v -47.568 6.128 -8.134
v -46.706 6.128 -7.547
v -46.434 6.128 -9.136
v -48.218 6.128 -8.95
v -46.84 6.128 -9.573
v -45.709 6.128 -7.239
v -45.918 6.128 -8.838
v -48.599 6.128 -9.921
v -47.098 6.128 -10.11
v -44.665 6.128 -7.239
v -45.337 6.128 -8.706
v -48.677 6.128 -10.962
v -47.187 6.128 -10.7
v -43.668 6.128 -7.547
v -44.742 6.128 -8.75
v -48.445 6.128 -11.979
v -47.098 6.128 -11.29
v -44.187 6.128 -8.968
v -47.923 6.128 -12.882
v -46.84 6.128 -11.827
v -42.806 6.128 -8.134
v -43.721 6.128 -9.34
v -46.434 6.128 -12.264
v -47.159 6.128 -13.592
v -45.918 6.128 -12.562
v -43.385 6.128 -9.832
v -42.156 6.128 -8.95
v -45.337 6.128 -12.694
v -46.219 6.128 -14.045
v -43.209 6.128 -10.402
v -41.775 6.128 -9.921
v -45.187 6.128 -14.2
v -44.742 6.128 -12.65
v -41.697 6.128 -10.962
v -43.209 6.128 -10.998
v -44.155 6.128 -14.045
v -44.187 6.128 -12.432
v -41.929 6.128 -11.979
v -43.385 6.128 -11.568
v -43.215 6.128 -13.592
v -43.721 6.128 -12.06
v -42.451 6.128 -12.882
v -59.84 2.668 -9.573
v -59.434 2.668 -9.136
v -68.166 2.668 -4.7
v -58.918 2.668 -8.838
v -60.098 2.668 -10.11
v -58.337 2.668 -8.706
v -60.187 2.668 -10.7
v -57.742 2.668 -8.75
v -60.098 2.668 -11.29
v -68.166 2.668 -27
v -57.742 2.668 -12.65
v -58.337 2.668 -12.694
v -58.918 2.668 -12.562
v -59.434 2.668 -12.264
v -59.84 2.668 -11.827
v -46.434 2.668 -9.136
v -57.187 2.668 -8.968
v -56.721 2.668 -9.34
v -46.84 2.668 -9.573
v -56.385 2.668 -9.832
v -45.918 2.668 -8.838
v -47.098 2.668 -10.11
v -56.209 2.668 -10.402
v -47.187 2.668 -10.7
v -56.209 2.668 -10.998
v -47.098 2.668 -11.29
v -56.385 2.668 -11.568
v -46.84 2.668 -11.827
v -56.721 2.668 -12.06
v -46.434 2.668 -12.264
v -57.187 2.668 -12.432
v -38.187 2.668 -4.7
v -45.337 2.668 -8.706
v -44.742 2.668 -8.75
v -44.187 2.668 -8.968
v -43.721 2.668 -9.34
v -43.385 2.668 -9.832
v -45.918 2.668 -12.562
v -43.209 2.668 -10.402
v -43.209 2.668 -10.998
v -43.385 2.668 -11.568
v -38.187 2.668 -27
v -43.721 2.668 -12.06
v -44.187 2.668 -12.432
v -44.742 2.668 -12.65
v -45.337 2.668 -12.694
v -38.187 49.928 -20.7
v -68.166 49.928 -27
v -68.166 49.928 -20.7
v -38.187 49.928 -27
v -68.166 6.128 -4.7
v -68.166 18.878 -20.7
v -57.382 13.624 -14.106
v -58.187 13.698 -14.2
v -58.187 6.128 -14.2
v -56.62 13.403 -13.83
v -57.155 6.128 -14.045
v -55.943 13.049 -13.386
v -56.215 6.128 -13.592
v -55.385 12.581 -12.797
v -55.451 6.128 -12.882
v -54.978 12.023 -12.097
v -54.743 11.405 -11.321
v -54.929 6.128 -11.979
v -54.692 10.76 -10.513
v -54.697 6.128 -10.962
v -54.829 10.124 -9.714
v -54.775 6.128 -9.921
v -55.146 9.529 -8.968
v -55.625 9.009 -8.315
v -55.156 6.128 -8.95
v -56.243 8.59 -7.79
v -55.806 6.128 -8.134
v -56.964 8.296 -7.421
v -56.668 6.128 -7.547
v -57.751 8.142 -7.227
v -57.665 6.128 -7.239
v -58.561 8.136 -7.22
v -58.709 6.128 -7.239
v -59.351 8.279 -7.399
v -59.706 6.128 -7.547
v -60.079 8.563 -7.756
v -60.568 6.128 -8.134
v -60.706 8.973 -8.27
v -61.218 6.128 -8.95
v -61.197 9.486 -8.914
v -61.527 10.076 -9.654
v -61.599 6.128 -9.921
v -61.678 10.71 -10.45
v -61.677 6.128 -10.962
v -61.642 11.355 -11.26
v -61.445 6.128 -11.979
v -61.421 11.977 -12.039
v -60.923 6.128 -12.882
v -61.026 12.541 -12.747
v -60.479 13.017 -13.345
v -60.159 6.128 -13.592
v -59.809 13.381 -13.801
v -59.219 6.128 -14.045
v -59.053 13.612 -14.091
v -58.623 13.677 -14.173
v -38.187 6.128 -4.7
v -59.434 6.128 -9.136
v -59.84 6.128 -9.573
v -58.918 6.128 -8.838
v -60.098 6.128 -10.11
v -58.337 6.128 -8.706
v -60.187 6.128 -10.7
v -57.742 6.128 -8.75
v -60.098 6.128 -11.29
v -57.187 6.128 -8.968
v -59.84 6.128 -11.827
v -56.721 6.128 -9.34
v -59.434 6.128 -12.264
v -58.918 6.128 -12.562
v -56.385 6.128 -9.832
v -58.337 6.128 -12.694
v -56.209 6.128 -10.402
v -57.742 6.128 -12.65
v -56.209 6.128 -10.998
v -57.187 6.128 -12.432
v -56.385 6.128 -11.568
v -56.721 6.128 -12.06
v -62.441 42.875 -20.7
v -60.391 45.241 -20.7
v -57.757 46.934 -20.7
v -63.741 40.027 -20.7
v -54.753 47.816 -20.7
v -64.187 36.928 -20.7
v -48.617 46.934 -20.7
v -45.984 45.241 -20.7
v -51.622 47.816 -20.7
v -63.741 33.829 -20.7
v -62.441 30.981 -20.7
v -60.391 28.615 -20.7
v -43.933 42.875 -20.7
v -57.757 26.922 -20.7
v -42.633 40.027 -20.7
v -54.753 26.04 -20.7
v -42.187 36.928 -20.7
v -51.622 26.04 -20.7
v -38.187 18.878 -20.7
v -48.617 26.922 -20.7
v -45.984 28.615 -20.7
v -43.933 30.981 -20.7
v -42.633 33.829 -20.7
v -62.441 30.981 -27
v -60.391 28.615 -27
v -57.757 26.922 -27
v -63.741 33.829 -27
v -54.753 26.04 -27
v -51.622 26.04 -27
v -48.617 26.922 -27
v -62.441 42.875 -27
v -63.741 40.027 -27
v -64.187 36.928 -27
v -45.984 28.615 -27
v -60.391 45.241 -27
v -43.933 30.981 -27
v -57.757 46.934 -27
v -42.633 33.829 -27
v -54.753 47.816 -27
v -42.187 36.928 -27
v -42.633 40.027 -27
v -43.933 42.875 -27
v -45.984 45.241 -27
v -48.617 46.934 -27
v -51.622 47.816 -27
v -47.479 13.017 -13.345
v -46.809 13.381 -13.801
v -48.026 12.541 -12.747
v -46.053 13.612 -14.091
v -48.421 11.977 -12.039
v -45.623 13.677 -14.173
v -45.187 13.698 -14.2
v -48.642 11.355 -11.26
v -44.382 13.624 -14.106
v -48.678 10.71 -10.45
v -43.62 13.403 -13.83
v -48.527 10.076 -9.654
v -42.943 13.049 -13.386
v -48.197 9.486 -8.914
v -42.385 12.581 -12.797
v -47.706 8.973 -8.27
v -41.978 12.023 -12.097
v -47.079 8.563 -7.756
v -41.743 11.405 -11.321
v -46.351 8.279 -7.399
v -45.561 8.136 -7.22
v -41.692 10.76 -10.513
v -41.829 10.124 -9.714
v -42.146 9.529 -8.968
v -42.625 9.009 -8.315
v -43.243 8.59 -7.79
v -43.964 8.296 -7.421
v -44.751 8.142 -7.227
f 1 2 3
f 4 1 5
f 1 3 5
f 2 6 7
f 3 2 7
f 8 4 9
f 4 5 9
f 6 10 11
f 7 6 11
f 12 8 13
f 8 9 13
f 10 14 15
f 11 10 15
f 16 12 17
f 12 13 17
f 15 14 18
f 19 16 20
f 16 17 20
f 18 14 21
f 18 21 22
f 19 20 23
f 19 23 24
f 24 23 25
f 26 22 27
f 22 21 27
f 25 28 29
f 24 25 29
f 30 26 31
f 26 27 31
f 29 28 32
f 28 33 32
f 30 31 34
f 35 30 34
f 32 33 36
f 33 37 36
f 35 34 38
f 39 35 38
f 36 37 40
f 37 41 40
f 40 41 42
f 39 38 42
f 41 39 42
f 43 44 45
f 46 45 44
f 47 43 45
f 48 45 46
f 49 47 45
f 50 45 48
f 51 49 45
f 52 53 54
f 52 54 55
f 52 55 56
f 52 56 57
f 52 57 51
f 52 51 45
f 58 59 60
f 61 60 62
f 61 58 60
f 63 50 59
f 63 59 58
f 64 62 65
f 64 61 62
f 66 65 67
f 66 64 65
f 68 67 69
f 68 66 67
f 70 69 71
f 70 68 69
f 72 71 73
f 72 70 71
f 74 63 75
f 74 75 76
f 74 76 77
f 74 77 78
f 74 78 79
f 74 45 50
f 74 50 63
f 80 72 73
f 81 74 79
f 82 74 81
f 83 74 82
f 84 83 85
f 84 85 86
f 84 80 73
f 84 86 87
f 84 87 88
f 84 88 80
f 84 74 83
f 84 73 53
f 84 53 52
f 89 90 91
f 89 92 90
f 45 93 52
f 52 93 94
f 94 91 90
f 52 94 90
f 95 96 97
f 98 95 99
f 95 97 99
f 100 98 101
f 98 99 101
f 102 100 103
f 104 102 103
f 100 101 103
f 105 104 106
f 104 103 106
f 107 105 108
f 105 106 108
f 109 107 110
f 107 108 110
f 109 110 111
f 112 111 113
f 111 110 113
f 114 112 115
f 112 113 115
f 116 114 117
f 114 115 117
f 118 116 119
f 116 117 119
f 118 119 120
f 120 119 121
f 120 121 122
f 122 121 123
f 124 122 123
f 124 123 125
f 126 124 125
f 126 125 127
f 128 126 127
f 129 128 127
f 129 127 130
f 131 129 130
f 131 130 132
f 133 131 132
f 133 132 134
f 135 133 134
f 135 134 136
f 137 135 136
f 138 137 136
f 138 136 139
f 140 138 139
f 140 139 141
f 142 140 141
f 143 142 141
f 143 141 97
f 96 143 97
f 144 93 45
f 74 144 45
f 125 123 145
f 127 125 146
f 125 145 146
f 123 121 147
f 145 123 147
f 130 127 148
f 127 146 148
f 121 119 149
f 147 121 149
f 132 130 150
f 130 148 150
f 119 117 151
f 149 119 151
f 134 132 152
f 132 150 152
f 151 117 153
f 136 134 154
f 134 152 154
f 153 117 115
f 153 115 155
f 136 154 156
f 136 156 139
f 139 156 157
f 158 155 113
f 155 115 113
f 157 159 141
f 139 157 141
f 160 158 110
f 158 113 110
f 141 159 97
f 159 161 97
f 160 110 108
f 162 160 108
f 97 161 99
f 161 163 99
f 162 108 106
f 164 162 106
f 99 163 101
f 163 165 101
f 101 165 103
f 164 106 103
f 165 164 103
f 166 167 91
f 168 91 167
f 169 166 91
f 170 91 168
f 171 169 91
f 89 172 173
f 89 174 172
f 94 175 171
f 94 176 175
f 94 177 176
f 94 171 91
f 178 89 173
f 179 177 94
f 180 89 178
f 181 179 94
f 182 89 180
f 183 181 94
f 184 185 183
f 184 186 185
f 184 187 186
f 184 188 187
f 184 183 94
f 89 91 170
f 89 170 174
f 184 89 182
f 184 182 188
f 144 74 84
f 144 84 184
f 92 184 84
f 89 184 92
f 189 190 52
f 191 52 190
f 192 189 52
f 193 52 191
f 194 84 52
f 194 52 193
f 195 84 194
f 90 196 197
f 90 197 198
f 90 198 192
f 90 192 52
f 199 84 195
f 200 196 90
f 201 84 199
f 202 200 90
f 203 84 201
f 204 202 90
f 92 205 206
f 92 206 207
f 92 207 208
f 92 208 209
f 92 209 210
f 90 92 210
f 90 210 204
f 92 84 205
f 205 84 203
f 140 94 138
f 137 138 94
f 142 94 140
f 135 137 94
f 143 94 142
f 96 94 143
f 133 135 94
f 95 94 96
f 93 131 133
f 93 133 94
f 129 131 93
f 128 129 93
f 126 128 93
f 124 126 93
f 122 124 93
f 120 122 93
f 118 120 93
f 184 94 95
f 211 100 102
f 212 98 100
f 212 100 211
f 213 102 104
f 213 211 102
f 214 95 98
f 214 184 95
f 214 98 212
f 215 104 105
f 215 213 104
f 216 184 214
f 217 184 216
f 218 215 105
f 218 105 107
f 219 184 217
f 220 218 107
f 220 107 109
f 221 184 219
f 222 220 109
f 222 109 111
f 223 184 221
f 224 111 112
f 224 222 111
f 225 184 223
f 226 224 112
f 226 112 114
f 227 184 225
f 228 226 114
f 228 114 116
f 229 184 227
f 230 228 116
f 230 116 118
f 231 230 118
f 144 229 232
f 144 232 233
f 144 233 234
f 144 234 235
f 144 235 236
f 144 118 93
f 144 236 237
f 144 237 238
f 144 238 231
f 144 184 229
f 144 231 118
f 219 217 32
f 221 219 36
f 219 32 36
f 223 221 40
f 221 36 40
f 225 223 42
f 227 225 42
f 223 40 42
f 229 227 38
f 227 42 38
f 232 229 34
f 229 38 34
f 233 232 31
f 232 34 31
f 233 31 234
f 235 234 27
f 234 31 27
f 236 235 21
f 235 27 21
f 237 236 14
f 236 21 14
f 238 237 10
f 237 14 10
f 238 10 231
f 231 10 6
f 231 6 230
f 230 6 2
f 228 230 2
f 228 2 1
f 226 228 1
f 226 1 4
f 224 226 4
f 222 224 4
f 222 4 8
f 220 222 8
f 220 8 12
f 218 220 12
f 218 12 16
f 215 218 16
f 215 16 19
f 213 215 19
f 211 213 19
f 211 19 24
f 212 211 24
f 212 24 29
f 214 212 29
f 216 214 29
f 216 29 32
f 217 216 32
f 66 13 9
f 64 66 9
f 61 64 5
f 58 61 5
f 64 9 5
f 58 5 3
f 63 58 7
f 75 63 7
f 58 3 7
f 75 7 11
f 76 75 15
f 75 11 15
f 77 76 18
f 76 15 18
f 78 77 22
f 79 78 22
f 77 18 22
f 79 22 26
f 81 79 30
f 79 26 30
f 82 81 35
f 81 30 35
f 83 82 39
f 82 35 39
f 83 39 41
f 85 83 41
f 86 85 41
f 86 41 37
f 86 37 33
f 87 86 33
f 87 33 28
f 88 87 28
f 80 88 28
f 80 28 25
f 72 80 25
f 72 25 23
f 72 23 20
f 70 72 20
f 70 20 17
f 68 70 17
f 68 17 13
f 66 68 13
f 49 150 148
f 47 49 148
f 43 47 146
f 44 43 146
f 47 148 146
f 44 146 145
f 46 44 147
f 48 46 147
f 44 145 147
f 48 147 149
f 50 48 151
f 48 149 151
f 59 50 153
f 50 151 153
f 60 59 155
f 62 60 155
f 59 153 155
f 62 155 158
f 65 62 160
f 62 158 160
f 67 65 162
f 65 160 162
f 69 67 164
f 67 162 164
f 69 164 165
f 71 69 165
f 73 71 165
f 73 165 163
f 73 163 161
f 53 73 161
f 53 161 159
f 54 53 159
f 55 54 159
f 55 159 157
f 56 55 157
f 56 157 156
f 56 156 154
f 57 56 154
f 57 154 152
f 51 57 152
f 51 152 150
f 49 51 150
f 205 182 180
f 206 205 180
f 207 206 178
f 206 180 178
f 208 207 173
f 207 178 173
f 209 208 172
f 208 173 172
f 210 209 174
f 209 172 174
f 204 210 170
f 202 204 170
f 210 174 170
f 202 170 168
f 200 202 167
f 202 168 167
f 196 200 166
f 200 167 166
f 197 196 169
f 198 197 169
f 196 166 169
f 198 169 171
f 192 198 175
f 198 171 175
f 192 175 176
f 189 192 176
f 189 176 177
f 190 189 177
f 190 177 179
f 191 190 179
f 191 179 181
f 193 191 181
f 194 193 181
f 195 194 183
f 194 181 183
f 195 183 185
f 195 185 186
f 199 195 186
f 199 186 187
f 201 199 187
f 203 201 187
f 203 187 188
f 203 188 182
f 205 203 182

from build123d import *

# Parameters (mm, degrees)
SKETCH1_W            = 93
SKETCH1_H            = 100
BOSS_EXTRUDE2_DEPTH  = 10
SKETCH4_W            = 10.01
SKETCH4_H            = 15
BOSS_EXTRUDE4_DEPTH  = 24
SKETCH5_R            = 2
CUT_EXTRUDE1_DEPTH   = 50
SKETCH7_R            = 11
CUT_EXTRUDE3_DEPTH   = 50
SKETCH14_W           = 61.5
SKETCH14_H           = 42
CUT_EXTRUDE8_DEPTH   = 4
SKETCH19_R           = 11
CUT_EXTRUDE11_DEPTH  = 15
SKETCH20_R           = 2
CUT_EXTRUDE12_DEPTH  = 10
SKETCH21_W           = 40
SKETCH21_H           = 6
BOSS_EXTRUDE5_DEPTH  = 27
SKETCH22_W           = 40
SKETCH22_H           = 6.3
BOSS_EXTRUDE7_DEPTH  = 40
SKETCH23_R           = 8
CUT_EXTRUDE13_DEPTH  = 40
SKETCH24_W           = 118.277817783
SKETCH24_H           = 41.8
CUT_EXTRUDE14_DEPTH  = 40
SKETCH25_W           = 31.5
SKETCH25_H           = 23.2
CUT_EXTRUDE15_DEPTH  = 20
CUT_EXTRUDE18_DEPTH  = 3
SKETCH27_R           = 4.1
SKETCH27_R_2         = 4
CUT_EXTRUDE29_DEPTH  = 3
SKETCH28_W           = 29.5
SKETCH28_H           = 58.2
CUT_EXTRUDE30_DEPTH  = 23
SKETCH29_W           = 32
SKETCH29_H           = 4
CUT_EXTRUDE31_DEPTH  = 23
SKETCH31_W           = 32
SKETCH31_H           = 6
BOSS_EXTRUDE9_DEPTH  = 6.6
SKETCH32_W           = 32
SKETCH32_H           = 6
BOSS_EXTRUDE10_DEPTH = 10
SKETCH33_R           = 2
CUT_EXTRUDE32_DEPTH  = 10
BOSS_EXTRUDE11_START = -32
BOSS_EXTRUDE11_DEPTH = 32
SKETCH35_R           = 3.5
CUT_EXTRUDE33_DEPTH  = 10
SKETCH36_W           = 40
SKETCH36_H           = 6.3
BOSS_EXTRUDE12_DEPTH = 18.8
SKETCH37_W           = 40
SKETCH37_H           = 6
BOSS_EXTRUDE13_DEPTH = 16
SKETCH38_R           = 2
CUT_EXTRUDE34_DEPTH  = 16
BOSS_EXTRUDE14_DEPTH = 40
SKETCH40_R           = 3.5
CUT_EXTRUDE35_DEPTH  = 16
SKETCH41_W           = 16
SKETCH41_H           = 64.8
CUT_EXTRUDE36_DEPTH  = 76
SKETCH42_W           = 20.7
SKETCH42_H           = 6
CUT_EXTRUDE37_DEPTH  = 76
SKETCH43_W           = 10.32098901
SKETCH43_H           = 73.075116481
CUT_EXTRUDE38_DEPTH  = 30
SKETCH44_W           = 2
SKETCH44_H           = 70.783229749
CUT_EXTRUDE39_DEPTH  = 30
SKETCH45_W           = 27.67901099
SKETCH45_H           = 15
CUT_EXTRUDE40_DEPTH  = 30
SKETCH46_W           = 27.67901099
SKETCH46_H           = 2.54
CUT_EXTRUDE41_DEPTH  = 110
SKETCH47_R           = 11
CUT_EXTRUDE42_DEPTH  = 20
BOSS_EXTRUDE16_DEPTH = 2.3


with BuildPart() as part:
    # Sketch1 → Boss-Extrude2 (new body)
    with BuildSketch(Plane.XY):
        with Locations((-29.68705036, 14.928057554)):
            Rectangle(SKETCH1_W, SKETCH1_H)
    extrude(amount=BOSS_EXTRUDE2_DEPTH)

    # Sketch4 → Boss-Extrude4 (add)
    with BuildSketch(Plane(origin=(16.81294964, 0, 0), x_dir=(0, 0, -1), z_dir=(1, 0, 0))):
        with Locations((-4.995, -12.571942446)):
            Rectangle(SKETCH4_W, SKETCH4_H)
    extrude(amount=BOSS_EXTRUDE4_DEPTH)

    # Sketch5 → Cut-Extrude1 (cut)
    with BuildSketch(Plane(origin=(0, -5.071942446, 0), x_dir=(1, 0, 0), z_dir=(0, 1, 0))):
        with Locations(Location((26.81294964, -5, 0), (0, 0, 180))):
            Circle(SKETCH5_R)
    extrude(amount=-CUT_EXTRUDE1_DEPTH, mode=Mode.SUBTRACT)

    # Sketch7 → Cut-Extrude3 (cut)
    with BuildSketch(Plane(origin=(0, 0, 0), x_dir=(-1, 0, 0), z_dir=(0, 0, -1))):
        with Locations((24.18705036, 36.928057554)):
            Circle(SKETCH7_R)
    extrude(amount=-CUT_EXTRUDE3_DEPTH, mode=Mode.SUBTRACT)

    # Sketch14 → Cut-Extrude8 (cut)
    with BuildSketch(Plane.XY.offset(10)):
        with Locations((-13.93705036, 36.789132279)):
            Rectangle(SKETCH14_W, SKETCH14_H)
    extrude(amount=-CUT_EXTRUDE8_DEPTH, mode=Mode.SUBTRACT)

    # Sketch19 → Cut-Extrude11 (cut)
    with BuildSketch(Plane(origin=(0, 0, 0), x_dir=(-1, 0, 0), z_dir=(0, 0, -1))):
        with Locations((53.18705036, 36.928057554)):
            Circle(SKETCH19_R)
    extrude(amount=-CUT_EXTRUDE11_DEPTH, mode=Mode.SUBTRACT)

    # Sketch20 → Cut-Extrude12 (cut)
    with BuildSketch(Plane.XY.offset(6)):
        with Locations((-34.68705036, 50.928057554)):
            Circle(SKETCH20_R)
        with Locations((5.31294964, 50.928057554)):
            Circle(SKETCH20_R)
        with Locations((-34.68705036, 22.928057554)):
            Circle(SKETCH20_R)
        with Locations((5.31294964, 22.928057554)):
            Circle(SKETCH20_R)
    extrude(amount=-CUT_EXTRUDE12_DEPTH, mode=Mode.SUBTRACT)

    # Sketch21 → Boss-Extrude5 (add)
    with BuildSketch(Plane(origin=(0, 0, 0), x_dir=(-1, 0, 0), z_dir=(0, 0, -1))):
        with Locations((56.18705036, 61.928057554)):
            Rectangle(SKETCH21_W, SKETCH21_H)
    extrude(amount=BOSS_EXTRUDE5_DEPTH)

    # Sketch22 → Boss-Extrude7 (add)
    with BuildSketch(Plane.XZ.offset(-58.928057554)):
        with Locations((-56.18705036, -23.85)):
            Rectangle(SKETCH22_W, SKETCH22_H)
    extrude(amount=BOSS_EXTRUDE7_DEPTH)

    # Sketch23 → Cut-Extrude13 (cut)
    with BuildSketch(Plane.XY.offset(10)):
        with Locations((-53.18705036, 36.928057554)):
            Circle(SKETCH23_R)
    extrude(amount=-CUT_EXTRUDE13_DEPTH, mode=Mode.SUBTRACT)

    # Sketch24 → Cut-Extrude14 (cut)
    with BuildSketch(Plane.XY.offset(10)):
        with Locations((-17.048141468, -14.171942446)):
            Rectangle(SKETCH24_W, SKETCH24_H)
    extrude(amount=-CUT_EXTRUDE14_DEPTH, mode=Mode.SUBTRACT)

    # Sketch25 → Cut-Extrude15 (cut)
    with BuildSketch(Plane.XY.offset(10)):
        with Locations((-60.43705036, 18.328057554)):
            Rectangle(SKETCH25_W, SKETCH25_H)
    extrude(amount=-CUT_EXTRUDE15_DEPTH, mode=Mode.SUBTRACT)

    # Sketch26 → Cut-Extrude18 (cut)
    with BuildSketch(Plane.XY.offset(6)):
        with BuildLine():
            Line((14.30212304, 57.789132279), (6.863398886, 57.789132279))
            Line((6.863398886, 57.789132279), (6.863398886, 54.615347499))
            ThreePointArc((6.863398886, 54.615347499), (8.24773413, 53.645968516), (9.108195728, 52.191428892))
            Line((9.108195728, 52.191428892), (14.30212304, 52.191428892))
            Line((14.30212304, 52.191428892), (14.30212304, 57.789132279))
        make_face()
        with BuildLine():
            Line((6.863398886, 19.240767609), (6.863398886, 15.789132279))
            Line((6.863398886, 15.789132279), (14.30212304, 15.789132279))
            Line((14.30212304, 15.789132279), (14.30212304, 20.928057554))
            Line((14.30212304, 20.928057554), (8.777051255, 20.928057554))
            ThreePointArc((8.777051255, 20.928057554), (7.95835451, 19.927752057), (6.863398886, 19.240767609))
        make_face()
        with BuildLine():
            Line((-36.237499605, 57.789132279), (-44.68705036, 57.789132279))
            Line((-44.68705036, 57.789132279), (-44.68705036, 52.191428892))
            Line((-44.68705036, 52.191428892), (-38.482296447, 52.191428892))
            ThreePointArc((-38.482296447, 52.191428892), (-37.621834849, 53.645968516), (-36.237499605, 54.615347499))
            Line((-36.237499605, 54.615347499), (-36.237499605, 57.789132279))
        make_face()
        with BuildLine():
            Line((-44.68705036, 21.664686216), (-44.68705036, 15.789132279))
            Line((-44.68705036, 15.789132279), (-36.237499605, 15.789132279))
            Line((-36.237499605, 15.789132279), (-36.237499605, 19.240767609))
            ThreePointArc((-36.237499605, 19.240767609), (-37.621834849, 20.210146592), (-38.482296447, 21.664686216))
            Line((-38.482296447, 21.664686216), (-44.68705036, 21.664686216))
        make_face()
    extrude(amount=-CUT_EXTRUDE18_DEPTH, mode=Mode.SUBTRACT)

    # Sketch27 → Cut-Extrude29 (cut)
    with BuildSketch(Plane.XY.offset(6)):
        with Locations((5.31294964, 50.928057554)):
            Circle(SKETCH27_R)
        with Locations((5.31294964, 22.928057554)):
            Circle(SKETCH27_R_2)
        with Locations((-34.68705036, 50.928057554)):
            Circle(SKETCH27_R)
        with Locations((-34.68705036, 22.928057554)):
            Circle(SKETCH27_R)
    extrude(amount=-CUT_EXTRUDE29_DEPTH, mode=Mode.SUBTRACT)

    # Sketch28 → Cut-Extrude30 (cut)
    with BuildSketch(Plane(origin=(0, 0, 0), x_dir=(-1, 0, 0), z_dir=(0, 0, -1))):
        with Locations((-2.06294964, 35.828057554)):
            Rectangle(SKETCH28_W, SKETCH28_H)
    extrude(amount=-CUT_EXTRUDE30_DEPTH, mode=Mode.SUBTRACT)

    # Sketch29 → Cut-Extrude31 (cut)
    with BuildSketch(Plane(origin=(0, 15.789132279, 0), x_dir=(1, 0, 0), z_dir=(0, 1, 0))):
        with Locations((-28.68705036, -8)):
            Rectangle(SKETCH29_W, SKETCH29_H)
    extrude(amount=-CUT_EXTRUDE31_DEPTH, mode=Mode.SUBTRACT)

    # Sketch31 → Boss-Extrude9 (add)
    with BuildSketch(Plane.XZ.offset(-6.728057554)):
        with Locations((-28.68705036, 3)):
            Rectangle(SKETCH31_W, SKETCH31_H)
    extrude(amount=BOSS_EXTRUDE9_DEPTH)

    # Sketch32 → Boss-Extrude10 (add)
    with BuildSketch(Plane.XY.offset(6)):
        with Locations((-28.68705036, 3.128057554)):
            Rectangle(SKETCH32_W, SKETCH32_H)
    extrude(amount=BOSS_EXTRUDE10_DEPTH)

    # Sketch33 → Cut-Extrude32 (cut)
    with BuildSketch(Plane(origin=(0, 6.128057554, 0), x_dir=(1, 0, 0), z_dir=(0, 1, 0))):
        with Locations(Location((-37.68705036, -11, 0), (0, 0, 270))):
            Circle(SKETCH33_R)
        with Locations(Location((-19.68705036, -11, 0), (0, 0, 270))):
            Circle(SKETCH33_R)
    extrude(amount=-CUT_EXTRUDE32_DEPTH, mode=Mode.SUBTRACT)

    # Sketch34 → Boss-Extrude11 (add)
    with BuildSketch(Plane(origin=(-12.68705036, 0, 0), x_dir=(0, 0, -1), z_dir=(1, 0, 0)).offset(BOSS_EXTRUDE11_START)):
        Polygon((-16, 6.128057554), (-6, 6.128057554), (-6, 14.058360342), align=None)
    extrude(amount=BOSS_EXTRUDE11_DEPTH)

    # Sketch35 → Cut-Extrude33 (cut)
    with BuildSketch(Plane.XZ.offset(-6.128057554)):
        with Locations((-19.68705036, 11)):
            Circle(SKETCH35_R)
        with Locations((-37.68705036, 11)):
            Circle(SKETCH35_R)
    extrude(amount=-CUT_EXTRUDE33_DEPTH, mode=Mode.SUBTRACT)

    # Sketch36 → Boss-Extrude12 (add)
    with BuildSketch(Plane.XZ.offset(-18.928057554)):
        with Locations((-56.18705036, -23.85)):
            Rectangle(SKETCH36_W, SKETCH36_H)
    extrude(amount=BOSS_EXTRUDE12_DEPTH)

    # Sketch37 → Boss-Extrude13 (add)
    with BuildSketch(Plane.XY.offset(-20.7)):
        with Locations((-56.18705036, 3.128057554)):
            Rectangle(SKETCH37_W, SKETCH37_H)
    extrude(amount=BOSS_EXTRUDE13_DEPTH)

    # Sketch38 → Cut-Extrude34 (cut)
    with BuildSketch(Plane(origin=(0, 6.128057554, 0), x_dir=(1, 0, 0), z_dir=(0, 1, 0))):
        with Locations(Location((-58.18705036, 10.7, 0), (0, 0, 180))):
            Circle(SKETCH38_R)
        with Locations(Location((-45.18705036, 10.7, 0), (0, 0, 180))):
            Circle(SKETCH38_R)
    extrude(amount=-CUT_EXTRUDE34_DEPTH, mode=Mode.SUBTRACT)

    # Sketch39 → Boss-Extrude14 (add)
    with BuildSketch(Plane(origin=(-36.18705036, 0, 0), x_dir=(0, 0, -1), z_dir=(1, 0, 0))):
        Polygon((4.7, 6.128057554), (20.7, 18.878141719), (20.7, 6.128057554), align=None)
    extrude(amount=-BOSS_EXTRUDE14_DEPTH)

    # Sketch40 → Cut-Extrude35 (cut)
    with BuildSketch(Plane.XZ.offset(-6.128057554)):
        with Locations(Location((-45.18705036, -10.7, 0), (0, 0, 270))):
            Circle(SKETCH40_R)
        with Locations(Location((-58.18705036, -10.7, 0), (0, 0, 270))):
            Circle(SKETCH40_R)
    extrude(amount=-CUT_EXTRUDE35_DEPTH, mode=Mode.SUBTRACT)

    # Sketch41 → Cut-Extrude36 (cut)
    with BuildSketch(Plane(origin=(-12.68705036, 0, 0), x_dir=(0, 0, -1), z_dir=(1, 0, 0))):
        with Locations((-8, 32.528057554)):
            Rectangle(SKETCH41_W, SKETCH41_H)
    extrude(amount=-CUT_EXTRUDE36_DEPTH, mode=Mode.SUBTRACT)

    # Sketch42 → Cut-Extrude37 (cut)
    with BuildSketch(Plane(origin=(-36.18705036, 0, 0), x_dir=(0, 0, -1), z_dir=(1, 0, 0))):
        with Locations((10.35, 61.928057554)):
            Rectangle(SKETCH42_W, SKETCH42_H)
    extrude(amount=-CUT_EXTRUDE37_DEPTH, mode=Mode.SUBTRACT)

    # Sketch43 → Cut-Extrude38 (cut)
    with BuildSketch(Plane.XY.offset(-4.7)):
        with Locations((-71.026555855, 36.665615794)):
            Rectangle(SKETCH43_W, SKETCH43_H)
    extrude(amount=-CUT_EXTRUDE38_DEPTH, mode=Mode.SUBTRACT)

    # Sketch44 → Cut-Extrude39 (cut)
    with BuildSketch(Plane.XY.offset(-4.7)):
        with Locations((-37.18705036, 35.519672429)):
            Rectangle(SKETCH44_W, SKETCH44_H)
    extrude(amount=-CUT_EXTRUDE39_DEPTH, mode=Mode.SUBTRACT)

    # Sketch45 → Cut-Extrude40 (cut)
    with BuildSketch(Plane.XY.offset(-20.7)):
        with Locations((-52.026555855, 57.428057554)):
            Rectangle(SKETCH45_W, SKETCH45_H)
    extrude(amount=-CUT_EXTRUDE40_DEPTH, mode=Mode.SUBTRACT)

    # Sketch46 → Cut-Extrude41 (cut)
    with BuildSketch(Plane.XY.offset(-4.7)):
        with Locations((-52.026555855, 1.398057554)):
            Rectangle(SKETCH46_W, SKETCH46_H)
    extrude(amount=-CUT_EXTRUDE41_DEPTH, mode=Mode.SUBTRACT)

    # Sketch47 → Cut-Extrude42 (cut)
    with BuildSketch(Plane.XY.offset(-20.7)):
        with Locations((-53.18705036, 36.928057554)):
            Circle(SKETCH47_R)
    extrude(amount=-CUT_EXTRUDE42_DEPTH, mode=Mode.SUBTRACT)

    # Sketch48 → Boss-Extrude16 (add)
    with BuildSketch(Plane.ZY.offset(65.86606135)):
        Polygon((-27, 49.928057554), (-20.7, 49.928057554), (-20.7, 18.878141719), (-4.7, 6.128057554), (-4.7, 2.668057554), (-27, 2.668057554), align=None)
    extrude(amount=BOSS_EXTRUDE16_DEPTH)


solid = part.part
